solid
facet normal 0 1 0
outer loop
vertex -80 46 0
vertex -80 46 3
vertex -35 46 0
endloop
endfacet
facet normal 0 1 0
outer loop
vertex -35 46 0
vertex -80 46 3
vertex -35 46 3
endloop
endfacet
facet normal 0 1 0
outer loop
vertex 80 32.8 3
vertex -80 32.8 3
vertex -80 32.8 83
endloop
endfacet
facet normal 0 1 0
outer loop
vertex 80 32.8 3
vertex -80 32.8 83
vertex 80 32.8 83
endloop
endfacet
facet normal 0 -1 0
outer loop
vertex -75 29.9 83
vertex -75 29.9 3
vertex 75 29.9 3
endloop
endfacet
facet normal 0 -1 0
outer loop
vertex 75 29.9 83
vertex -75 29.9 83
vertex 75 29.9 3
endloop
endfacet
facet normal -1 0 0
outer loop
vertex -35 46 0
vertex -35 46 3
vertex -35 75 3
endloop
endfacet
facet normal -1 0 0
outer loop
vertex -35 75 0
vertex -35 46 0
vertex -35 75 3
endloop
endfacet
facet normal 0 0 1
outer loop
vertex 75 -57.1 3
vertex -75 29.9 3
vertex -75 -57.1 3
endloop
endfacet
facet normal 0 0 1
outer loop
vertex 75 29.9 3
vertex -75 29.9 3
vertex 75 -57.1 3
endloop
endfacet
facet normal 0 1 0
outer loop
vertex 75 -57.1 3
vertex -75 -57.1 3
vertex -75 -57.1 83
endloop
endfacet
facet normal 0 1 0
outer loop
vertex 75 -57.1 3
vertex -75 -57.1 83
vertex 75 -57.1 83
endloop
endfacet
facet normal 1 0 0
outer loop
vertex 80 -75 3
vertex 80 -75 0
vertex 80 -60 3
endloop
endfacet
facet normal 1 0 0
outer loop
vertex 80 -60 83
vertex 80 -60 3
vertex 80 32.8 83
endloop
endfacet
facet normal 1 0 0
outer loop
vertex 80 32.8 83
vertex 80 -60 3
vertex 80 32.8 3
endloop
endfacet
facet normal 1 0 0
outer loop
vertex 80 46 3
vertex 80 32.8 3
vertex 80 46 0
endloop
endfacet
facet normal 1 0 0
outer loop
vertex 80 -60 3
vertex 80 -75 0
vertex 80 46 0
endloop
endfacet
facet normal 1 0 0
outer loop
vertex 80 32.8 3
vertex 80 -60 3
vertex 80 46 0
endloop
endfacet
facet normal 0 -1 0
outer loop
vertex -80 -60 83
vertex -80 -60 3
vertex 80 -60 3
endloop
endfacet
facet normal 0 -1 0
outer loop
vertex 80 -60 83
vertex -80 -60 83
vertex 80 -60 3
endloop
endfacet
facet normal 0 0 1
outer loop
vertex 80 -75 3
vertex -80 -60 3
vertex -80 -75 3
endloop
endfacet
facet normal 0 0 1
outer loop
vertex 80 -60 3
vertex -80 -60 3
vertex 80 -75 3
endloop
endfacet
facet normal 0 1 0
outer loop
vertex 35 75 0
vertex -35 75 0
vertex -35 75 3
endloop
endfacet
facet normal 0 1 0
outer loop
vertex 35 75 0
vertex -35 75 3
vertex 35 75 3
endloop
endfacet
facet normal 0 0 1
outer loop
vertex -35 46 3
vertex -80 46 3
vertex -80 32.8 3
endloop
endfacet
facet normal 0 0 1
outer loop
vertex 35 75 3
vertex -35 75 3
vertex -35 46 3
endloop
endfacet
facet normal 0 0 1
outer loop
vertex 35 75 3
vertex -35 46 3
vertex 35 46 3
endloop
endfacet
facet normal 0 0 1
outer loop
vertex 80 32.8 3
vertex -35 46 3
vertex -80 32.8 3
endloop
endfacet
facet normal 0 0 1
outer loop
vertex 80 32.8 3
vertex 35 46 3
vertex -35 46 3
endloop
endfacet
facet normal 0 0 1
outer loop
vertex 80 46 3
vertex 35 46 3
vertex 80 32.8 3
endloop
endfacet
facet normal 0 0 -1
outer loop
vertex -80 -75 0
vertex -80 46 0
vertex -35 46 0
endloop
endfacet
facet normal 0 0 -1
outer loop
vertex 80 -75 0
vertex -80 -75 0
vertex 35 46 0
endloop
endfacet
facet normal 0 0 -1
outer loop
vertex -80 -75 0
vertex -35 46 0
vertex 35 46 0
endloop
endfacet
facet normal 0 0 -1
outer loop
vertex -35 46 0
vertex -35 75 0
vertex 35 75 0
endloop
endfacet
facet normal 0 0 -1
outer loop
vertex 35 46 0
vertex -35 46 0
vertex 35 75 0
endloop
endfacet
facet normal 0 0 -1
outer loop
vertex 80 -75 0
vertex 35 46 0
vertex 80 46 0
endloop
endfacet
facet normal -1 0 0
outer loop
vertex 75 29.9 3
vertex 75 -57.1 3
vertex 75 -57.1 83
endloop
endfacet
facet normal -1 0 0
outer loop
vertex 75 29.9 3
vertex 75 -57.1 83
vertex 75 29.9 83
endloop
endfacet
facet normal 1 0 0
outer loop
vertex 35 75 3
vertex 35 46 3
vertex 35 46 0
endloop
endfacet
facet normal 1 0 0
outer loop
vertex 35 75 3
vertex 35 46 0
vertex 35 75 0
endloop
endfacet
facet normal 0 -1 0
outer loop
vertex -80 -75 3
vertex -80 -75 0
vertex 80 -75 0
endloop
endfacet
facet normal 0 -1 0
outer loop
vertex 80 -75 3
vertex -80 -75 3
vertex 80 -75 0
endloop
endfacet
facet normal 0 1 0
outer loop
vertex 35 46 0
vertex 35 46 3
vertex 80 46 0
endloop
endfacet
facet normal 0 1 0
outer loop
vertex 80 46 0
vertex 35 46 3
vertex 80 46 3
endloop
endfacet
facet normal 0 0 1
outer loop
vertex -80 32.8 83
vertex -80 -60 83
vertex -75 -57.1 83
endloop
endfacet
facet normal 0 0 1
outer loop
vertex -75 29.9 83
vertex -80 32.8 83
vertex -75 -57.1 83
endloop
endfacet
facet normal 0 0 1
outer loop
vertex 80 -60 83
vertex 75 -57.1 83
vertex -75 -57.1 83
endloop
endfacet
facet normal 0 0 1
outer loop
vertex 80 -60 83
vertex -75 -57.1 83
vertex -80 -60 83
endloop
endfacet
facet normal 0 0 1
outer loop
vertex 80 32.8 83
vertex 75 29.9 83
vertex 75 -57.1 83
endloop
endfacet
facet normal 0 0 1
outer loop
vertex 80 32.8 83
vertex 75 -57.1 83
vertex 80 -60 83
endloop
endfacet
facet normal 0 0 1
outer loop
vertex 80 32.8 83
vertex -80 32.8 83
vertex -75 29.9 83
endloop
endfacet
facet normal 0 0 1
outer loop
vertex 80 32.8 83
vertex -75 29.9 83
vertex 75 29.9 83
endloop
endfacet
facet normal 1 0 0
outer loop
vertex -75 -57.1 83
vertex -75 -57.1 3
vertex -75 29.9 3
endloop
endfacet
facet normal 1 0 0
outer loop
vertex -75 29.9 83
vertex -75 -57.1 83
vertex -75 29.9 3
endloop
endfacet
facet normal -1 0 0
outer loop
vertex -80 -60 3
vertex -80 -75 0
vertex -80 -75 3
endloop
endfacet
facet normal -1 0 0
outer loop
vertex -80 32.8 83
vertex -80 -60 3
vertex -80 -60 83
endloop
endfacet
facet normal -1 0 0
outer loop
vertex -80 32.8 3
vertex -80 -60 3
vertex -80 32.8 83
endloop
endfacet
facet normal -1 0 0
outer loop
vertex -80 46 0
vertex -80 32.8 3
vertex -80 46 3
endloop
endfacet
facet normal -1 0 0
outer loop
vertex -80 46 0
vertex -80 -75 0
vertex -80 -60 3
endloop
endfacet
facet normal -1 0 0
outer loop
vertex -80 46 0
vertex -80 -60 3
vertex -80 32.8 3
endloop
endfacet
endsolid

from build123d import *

# Parameters (mm, degrees)
SKETCH_1_W          = 160
SKETCH_1_H          = 150
EXTRUDE_1_DEPTH     = 3
SKETCH_2_W          = 160
SKETCH_2_H          = 92.8
SKETCH_2_W_2        = 150
SKETCH_2_H_2        = 87
EXTRUDE_2_DEPTH     = 80
SKETCH_4_W          = 45
SKETCH_4_H          = 29
CUT_EXTRUDE_2_DEPTH = 3


with BuildPart() as part:
    # ｽｹｯﾁ1 → ﾎﾞｽ - 押し出し1 (new body)
    with BuildSketch(Plane.XY):
        Rectangle(SKETCH_1_W, SKETCH_1_H)
    extrude(amount=EXTRUDE_1_DEPTH)

    # ｽｹｯﾁ2 → ﾎﾞｽ - 押し出し2 (add)
    with BuildSketch(Plane.XY.offset(3)):
        with Locations((0, -13.6)):
            Rectangle(SKETCH_2_W, SKETCH_2_H)
        with Locations((0, -13.6)):
            Rectangle(SKETCH_2_W_2, SKETCH_2_H_2, mode=Mode.SUBTRACT)
    extrude(amount=EXTRUDE_2_DEPTH)

    # ｽｹｯﾁ4 → ｶｯﾄ - 押し出し2 (cut)
    with BuildSketch(Plane.XY.offset(3)):
        with Locations((-57.5, 60.5)):
            Rectangle(SKETCH_4_W, SKETCH_4_H)
        with Locations((57.5, 60.5)):
            Rectangle(SKETCH_4_W, SKETCH_4_H)
    extrude(amount=-CUT_EXTRUDE_2_DEPTH, mode=Mode.SUBTRACT)


solid = part.part
